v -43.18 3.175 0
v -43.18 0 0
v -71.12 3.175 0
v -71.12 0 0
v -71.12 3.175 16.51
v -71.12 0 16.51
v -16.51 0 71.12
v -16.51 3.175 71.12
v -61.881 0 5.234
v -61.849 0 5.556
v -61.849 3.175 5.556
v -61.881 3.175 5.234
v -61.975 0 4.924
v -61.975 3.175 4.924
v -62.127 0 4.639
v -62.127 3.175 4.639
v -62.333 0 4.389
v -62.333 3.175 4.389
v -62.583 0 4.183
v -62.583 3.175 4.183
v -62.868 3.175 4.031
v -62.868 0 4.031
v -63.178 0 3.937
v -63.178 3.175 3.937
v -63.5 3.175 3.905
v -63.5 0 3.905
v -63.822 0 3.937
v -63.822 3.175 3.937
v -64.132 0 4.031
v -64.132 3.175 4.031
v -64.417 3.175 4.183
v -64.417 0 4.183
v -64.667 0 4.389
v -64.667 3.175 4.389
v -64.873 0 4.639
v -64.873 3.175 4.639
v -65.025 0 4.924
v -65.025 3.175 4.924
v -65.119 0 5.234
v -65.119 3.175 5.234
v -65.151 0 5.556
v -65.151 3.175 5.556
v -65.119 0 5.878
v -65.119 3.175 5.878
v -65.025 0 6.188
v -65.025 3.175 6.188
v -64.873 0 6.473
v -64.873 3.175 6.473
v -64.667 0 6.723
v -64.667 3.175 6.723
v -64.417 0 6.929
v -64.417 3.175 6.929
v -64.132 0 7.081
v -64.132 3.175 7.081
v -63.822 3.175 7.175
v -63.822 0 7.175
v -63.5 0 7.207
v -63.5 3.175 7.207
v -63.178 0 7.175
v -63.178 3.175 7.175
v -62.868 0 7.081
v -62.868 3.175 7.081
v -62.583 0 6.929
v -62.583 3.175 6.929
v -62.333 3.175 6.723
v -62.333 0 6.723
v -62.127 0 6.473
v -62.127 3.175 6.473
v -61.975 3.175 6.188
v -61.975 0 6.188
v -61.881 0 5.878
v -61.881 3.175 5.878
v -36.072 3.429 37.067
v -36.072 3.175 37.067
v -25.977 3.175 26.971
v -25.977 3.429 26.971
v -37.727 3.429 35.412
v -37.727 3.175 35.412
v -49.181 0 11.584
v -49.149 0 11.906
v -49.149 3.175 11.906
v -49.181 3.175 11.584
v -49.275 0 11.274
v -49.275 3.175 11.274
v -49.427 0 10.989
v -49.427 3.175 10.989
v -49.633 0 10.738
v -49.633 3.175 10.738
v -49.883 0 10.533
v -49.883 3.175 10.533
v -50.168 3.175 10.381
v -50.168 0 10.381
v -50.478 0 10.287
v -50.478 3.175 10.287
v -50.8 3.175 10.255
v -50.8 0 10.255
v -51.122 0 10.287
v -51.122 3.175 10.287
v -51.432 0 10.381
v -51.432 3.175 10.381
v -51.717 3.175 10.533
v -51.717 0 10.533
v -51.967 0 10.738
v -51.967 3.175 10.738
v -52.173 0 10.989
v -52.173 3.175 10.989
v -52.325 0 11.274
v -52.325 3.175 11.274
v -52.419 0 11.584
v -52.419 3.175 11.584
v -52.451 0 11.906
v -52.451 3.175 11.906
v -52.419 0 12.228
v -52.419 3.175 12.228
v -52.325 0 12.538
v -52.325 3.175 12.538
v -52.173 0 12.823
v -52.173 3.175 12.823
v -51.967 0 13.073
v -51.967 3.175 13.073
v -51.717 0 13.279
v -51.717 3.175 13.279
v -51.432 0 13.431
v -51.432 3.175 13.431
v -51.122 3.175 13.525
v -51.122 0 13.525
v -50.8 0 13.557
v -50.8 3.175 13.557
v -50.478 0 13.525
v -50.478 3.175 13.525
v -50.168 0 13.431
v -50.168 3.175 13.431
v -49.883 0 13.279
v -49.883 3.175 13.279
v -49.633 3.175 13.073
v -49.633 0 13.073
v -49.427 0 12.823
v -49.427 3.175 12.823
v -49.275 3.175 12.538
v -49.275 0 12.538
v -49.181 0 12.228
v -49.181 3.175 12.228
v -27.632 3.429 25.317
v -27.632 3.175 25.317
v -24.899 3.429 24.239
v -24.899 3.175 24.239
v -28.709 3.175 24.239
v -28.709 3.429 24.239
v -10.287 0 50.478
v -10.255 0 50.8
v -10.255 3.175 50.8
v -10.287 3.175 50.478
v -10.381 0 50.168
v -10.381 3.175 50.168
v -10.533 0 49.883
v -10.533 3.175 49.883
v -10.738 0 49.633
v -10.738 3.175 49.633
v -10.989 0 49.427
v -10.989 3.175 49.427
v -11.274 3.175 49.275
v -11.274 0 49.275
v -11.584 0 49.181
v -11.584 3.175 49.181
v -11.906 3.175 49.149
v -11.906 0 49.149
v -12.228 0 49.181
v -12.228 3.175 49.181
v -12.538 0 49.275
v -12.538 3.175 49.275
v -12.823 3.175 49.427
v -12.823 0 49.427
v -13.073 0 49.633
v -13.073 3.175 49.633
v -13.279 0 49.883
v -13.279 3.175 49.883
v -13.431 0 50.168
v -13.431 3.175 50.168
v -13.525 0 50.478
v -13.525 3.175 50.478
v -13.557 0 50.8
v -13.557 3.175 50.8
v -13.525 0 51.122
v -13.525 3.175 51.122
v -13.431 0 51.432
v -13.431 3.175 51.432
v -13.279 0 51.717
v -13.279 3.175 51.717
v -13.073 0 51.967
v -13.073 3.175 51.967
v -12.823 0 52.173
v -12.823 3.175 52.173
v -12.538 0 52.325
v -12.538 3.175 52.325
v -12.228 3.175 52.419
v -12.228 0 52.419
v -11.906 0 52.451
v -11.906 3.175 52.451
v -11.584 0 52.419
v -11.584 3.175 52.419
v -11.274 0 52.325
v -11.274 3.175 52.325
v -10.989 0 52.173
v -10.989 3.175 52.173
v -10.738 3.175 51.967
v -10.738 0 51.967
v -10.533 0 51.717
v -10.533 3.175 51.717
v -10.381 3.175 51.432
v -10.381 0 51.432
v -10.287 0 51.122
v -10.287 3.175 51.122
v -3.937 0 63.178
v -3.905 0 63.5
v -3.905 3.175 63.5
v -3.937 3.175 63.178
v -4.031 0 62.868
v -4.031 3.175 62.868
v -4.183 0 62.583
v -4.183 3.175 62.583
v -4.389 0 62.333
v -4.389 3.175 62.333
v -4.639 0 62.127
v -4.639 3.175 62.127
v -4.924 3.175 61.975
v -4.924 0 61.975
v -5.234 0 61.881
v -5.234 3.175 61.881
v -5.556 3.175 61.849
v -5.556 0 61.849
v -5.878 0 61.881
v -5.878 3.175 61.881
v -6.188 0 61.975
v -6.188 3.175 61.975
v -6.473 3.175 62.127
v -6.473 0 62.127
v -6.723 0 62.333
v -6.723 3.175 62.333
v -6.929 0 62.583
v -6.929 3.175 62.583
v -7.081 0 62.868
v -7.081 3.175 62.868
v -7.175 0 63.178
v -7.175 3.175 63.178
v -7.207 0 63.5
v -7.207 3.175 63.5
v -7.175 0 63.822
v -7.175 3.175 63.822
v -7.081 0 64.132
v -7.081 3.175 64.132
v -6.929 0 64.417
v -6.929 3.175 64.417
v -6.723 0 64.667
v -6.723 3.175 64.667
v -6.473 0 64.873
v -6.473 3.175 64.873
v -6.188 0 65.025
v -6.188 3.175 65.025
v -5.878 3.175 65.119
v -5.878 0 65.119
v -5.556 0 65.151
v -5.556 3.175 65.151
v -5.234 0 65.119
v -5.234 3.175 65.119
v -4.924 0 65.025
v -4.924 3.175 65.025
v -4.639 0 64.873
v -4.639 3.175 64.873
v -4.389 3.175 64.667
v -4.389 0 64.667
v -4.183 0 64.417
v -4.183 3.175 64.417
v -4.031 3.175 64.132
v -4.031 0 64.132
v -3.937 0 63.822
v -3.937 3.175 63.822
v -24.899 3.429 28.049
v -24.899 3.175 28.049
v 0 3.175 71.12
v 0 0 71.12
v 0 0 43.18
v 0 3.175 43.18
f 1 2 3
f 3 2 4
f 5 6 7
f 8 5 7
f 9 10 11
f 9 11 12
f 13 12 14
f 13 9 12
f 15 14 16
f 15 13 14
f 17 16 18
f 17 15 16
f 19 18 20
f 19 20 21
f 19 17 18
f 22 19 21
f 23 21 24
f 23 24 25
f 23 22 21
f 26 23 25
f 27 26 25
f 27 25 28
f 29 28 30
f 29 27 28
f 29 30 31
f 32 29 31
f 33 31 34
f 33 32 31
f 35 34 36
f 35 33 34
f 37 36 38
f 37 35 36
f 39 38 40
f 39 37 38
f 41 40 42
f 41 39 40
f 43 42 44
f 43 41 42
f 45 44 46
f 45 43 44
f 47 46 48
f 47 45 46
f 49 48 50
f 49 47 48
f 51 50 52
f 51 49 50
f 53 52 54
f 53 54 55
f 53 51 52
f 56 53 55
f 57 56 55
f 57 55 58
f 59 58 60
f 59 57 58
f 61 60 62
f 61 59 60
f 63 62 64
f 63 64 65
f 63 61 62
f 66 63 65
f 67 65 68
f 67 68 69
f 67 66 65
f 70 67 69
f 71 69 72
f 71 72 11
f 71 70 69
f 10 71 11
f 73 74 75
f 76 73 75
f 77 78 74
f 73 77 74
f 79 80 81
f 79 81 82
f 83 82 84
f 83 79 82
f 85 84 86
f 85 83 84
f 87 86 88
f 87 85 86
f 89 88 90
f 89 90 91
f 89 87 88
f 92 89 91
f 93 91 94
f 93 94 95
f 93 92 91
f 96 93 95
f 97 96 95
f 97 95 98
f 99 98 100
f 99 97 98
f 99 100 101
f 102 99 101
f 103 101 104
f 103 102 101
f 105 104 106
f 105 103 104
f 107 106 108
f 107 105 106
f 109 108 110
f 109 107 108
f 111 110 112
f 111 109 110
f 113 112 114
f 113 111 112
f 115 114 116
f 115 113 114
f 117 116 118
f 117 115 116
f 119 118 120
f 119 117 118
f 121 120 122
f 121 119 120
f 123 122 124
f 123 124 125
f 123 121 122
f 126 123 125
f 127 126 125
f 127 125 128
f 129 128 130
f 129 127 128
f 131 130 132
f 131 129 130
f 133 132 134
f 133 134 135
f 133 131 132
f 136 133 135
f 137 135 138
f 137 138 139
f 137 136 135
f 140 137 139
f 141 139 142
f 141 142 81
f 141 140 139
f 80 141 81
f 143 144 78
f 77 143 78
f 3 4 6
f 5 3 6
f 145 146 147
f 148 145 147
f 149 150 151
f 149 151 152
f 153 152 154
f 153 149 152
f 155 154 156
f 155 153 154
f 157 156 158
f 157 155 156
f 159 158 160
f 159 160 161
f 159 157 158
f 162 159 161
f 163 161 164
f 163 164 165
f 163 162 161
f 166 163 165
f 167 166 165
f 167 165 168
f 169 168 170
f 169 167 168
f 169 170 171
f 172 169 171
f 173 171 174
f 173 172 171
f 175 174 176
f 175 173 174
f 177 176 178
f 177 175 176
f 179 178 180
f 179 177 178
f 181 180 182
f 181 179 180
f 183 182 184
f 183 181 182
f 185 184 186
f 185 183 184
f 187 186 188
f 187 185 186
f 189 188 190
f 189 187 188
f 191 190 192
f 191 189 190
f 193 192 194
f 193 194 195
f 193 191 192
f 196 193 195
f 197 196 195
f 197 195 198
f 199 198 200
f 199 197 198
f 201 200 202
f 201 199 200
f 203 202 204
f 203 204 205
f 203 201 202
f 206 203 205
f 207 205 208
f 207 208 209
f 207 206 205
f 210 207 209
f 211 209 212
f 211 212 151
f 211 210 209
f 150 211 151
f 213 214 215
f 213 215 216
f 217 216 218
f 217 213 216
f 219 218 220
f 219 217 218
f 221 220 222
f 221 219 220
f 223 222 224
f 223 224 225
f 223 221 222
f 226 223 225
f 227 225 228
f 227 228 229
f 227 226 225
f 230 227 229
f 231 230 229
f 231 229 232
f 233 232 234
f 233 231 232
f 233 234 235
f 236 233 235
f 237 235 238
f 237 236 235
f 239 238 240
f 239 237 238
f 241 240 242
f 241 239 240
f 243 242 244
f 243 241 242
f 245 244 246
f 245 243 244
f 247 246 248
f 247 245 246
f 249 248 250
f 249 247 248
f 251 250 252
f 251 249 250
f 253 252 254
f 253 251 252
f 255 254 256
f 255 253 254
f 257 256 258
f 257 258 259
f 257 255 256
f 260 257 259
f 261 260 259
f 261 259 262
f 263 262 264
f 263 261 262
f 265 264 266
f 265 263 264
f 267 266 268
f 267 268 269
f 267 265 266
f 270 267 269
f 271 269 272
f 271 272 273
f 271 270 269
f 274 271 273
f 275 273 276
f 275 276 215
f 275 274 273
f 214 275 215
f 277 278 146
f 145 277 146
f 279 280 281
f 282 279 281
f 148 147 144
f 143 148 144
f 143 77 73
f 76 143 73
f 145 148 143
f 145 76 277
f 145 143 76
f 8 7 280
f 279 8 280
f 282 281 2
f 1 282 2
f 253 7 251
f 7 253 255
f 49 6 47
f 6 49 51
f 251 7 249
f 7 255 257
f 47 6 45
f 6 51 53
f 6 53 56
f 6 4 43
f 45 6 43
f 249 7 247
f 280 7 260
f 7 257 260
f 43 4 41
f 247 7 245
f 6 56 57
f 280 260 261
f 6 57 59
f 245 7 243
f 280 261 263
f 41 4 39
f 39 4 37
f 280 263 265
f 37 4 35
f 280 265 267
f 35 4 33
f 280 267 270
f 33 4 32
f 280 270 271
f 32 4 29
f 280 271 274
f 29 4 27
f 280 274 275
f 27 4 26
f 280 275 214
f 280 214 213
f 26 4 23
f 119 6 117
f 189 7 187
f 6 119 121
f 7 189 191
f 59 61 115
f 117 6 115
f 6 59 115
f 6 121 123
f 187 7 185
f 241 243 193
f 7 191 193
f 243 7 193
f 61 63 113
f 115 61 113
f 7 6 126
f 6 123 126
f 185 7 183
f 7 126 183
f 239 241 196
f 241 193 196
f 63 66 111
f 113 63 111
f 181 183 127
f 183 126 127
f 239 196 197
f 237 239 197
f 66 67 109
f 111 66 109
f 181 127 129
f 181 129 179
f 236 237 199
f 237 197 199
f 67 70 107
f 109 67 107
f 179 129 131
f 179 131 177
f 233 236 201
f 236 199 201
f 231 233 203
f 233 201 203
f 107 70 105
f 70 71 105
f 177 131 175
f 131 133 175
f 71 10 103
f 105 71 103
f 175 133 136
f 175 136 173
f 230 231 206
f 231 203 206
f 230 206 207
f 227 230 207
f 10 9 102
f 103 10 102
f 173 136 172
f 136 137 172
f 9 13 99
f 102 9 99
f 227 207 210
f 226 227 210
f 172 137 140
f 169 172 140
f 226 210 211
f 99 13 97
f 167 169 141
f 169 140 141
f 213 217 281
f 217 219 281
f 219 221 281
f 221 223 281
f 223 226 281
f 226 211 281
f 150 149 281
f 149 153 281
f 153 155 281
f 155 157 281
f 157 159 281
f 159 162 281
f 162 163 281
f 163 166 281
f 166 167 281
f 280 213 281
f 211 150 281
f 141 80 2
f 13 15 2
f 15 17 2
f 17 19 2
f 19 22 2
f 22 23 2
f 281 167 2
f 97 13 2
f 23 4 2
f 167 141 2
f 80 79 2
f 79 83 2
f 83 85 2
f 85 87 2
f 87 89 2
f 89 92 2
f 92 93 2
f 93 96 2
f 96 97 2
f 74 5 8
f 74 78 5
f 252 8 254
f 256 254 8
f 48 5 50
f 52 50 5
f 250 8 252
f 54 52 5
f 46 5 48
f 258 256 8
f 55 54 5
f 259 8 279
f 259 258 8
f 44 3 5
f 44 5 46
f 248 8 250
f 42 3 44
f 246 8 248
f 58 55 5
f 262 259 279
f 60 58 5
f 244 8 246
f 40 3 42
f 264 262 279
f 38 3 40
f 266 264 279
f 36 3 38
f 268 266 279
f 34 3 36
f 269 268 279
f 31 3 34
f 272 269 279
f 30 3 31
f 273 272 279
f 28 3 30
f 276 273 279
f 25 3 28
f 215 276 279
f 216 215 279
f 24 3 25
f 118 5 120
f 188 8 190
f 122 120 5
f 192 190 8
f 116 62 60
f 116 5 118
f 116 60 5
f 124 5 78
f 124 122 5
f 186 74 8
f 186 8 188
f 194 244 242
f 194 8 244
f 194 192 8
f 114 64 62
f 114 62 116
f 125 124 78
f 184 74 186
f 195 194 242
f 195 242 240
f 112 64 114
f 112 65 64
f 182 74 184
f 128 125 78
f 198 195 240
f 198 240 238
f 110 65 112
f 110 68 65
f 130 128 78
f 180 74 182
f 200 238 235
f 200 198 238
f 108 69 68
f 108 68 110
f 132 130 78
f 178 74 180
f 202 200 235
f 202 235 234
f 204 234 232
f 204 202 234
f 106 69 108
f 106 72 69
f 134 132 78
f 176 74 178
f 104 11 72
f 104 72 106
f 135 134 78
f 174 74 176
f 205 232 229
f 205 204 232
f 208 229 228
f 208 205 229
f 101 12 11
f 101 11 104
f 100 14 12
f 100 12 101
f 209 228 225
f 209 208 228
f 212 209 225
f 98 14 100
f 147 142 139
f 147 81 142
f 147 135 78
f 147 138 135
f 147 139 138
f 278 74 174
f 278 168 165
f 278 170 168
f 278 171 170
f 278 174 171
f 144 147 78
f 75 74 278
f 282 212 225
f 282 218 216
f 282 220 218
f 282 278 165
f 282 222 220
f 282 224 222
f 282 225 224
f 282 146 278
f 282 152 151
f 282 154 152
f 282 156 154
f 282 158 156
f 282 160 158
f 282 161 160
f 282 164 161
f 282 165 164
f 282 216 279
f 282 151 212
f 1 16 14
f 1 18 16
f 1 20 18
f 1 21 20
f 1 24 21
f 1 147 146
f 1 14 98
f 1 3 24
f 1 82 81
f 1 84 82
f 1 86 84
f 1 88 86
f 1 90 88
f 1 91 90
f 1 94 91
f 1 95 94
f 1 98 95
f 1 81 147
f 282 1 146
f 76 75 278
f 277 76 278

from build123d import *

# Parameters (mm, degrees)
SKETCH1_R           = 1.651
BOSS_EXTRUDE2_DEPTH = 3.175
BOSS_EXTRUDE3_DEPTH = 0.254


with BuildPart() as part:
    # Sketch1 → Boss-Extrude2 (new body)
    with BuildSketch(Plane(origin=(0, 0, 0), x_dir=(1, 0, 0), z_dir=(0, 1, 0))):
        Polygon((0, -43.18), (-43.18, 0), (-71.12, 0), (-71.12, -16.51), (-16.51, -71.12), (0, -71.12), align=None)
        with Locations((-5.55605696, -63.5)):
            Circle(SKETCH1_R, mode=Mode.SUBTRACT)
        with Locations((-11.905836488, -50.8)):
            Circle(SKETCH1_R, mode=Mode.SUBTRACT)
        with Locations((-63.5, -5.55605696)):
            Circle(SKETCH1_R, mode=Mode.SUBTRACT)
        with Locations((-50.8, -11.905836488)):
            Circle(SKETCH1_R, mode=Mode.SUBTRACT)
    extrude(amount=BOSS_EXTRUDE2_DEPTH)

    # Sketch5 → Boss-Extrude3 (add)
    with BuildSketch(Plane(origin=(0, 3.175, 0), x_dir=(1, 0, 0), z_dir=(0, 1, 0))):
        Polygon((-24.899422015, -24.239032228), (-28.709422015, -24.239032228), (-27.63179128, -25.316662963), (-37.727112803, -35.411984485), (-36.072374272, -37.066723016), (-25.977052749, -26.971401493), (-24.899422015, -28.049032228), align=None)
    extrude(amount=BOSS_EXTRUDE3_DEPTH)


solid = part.part
